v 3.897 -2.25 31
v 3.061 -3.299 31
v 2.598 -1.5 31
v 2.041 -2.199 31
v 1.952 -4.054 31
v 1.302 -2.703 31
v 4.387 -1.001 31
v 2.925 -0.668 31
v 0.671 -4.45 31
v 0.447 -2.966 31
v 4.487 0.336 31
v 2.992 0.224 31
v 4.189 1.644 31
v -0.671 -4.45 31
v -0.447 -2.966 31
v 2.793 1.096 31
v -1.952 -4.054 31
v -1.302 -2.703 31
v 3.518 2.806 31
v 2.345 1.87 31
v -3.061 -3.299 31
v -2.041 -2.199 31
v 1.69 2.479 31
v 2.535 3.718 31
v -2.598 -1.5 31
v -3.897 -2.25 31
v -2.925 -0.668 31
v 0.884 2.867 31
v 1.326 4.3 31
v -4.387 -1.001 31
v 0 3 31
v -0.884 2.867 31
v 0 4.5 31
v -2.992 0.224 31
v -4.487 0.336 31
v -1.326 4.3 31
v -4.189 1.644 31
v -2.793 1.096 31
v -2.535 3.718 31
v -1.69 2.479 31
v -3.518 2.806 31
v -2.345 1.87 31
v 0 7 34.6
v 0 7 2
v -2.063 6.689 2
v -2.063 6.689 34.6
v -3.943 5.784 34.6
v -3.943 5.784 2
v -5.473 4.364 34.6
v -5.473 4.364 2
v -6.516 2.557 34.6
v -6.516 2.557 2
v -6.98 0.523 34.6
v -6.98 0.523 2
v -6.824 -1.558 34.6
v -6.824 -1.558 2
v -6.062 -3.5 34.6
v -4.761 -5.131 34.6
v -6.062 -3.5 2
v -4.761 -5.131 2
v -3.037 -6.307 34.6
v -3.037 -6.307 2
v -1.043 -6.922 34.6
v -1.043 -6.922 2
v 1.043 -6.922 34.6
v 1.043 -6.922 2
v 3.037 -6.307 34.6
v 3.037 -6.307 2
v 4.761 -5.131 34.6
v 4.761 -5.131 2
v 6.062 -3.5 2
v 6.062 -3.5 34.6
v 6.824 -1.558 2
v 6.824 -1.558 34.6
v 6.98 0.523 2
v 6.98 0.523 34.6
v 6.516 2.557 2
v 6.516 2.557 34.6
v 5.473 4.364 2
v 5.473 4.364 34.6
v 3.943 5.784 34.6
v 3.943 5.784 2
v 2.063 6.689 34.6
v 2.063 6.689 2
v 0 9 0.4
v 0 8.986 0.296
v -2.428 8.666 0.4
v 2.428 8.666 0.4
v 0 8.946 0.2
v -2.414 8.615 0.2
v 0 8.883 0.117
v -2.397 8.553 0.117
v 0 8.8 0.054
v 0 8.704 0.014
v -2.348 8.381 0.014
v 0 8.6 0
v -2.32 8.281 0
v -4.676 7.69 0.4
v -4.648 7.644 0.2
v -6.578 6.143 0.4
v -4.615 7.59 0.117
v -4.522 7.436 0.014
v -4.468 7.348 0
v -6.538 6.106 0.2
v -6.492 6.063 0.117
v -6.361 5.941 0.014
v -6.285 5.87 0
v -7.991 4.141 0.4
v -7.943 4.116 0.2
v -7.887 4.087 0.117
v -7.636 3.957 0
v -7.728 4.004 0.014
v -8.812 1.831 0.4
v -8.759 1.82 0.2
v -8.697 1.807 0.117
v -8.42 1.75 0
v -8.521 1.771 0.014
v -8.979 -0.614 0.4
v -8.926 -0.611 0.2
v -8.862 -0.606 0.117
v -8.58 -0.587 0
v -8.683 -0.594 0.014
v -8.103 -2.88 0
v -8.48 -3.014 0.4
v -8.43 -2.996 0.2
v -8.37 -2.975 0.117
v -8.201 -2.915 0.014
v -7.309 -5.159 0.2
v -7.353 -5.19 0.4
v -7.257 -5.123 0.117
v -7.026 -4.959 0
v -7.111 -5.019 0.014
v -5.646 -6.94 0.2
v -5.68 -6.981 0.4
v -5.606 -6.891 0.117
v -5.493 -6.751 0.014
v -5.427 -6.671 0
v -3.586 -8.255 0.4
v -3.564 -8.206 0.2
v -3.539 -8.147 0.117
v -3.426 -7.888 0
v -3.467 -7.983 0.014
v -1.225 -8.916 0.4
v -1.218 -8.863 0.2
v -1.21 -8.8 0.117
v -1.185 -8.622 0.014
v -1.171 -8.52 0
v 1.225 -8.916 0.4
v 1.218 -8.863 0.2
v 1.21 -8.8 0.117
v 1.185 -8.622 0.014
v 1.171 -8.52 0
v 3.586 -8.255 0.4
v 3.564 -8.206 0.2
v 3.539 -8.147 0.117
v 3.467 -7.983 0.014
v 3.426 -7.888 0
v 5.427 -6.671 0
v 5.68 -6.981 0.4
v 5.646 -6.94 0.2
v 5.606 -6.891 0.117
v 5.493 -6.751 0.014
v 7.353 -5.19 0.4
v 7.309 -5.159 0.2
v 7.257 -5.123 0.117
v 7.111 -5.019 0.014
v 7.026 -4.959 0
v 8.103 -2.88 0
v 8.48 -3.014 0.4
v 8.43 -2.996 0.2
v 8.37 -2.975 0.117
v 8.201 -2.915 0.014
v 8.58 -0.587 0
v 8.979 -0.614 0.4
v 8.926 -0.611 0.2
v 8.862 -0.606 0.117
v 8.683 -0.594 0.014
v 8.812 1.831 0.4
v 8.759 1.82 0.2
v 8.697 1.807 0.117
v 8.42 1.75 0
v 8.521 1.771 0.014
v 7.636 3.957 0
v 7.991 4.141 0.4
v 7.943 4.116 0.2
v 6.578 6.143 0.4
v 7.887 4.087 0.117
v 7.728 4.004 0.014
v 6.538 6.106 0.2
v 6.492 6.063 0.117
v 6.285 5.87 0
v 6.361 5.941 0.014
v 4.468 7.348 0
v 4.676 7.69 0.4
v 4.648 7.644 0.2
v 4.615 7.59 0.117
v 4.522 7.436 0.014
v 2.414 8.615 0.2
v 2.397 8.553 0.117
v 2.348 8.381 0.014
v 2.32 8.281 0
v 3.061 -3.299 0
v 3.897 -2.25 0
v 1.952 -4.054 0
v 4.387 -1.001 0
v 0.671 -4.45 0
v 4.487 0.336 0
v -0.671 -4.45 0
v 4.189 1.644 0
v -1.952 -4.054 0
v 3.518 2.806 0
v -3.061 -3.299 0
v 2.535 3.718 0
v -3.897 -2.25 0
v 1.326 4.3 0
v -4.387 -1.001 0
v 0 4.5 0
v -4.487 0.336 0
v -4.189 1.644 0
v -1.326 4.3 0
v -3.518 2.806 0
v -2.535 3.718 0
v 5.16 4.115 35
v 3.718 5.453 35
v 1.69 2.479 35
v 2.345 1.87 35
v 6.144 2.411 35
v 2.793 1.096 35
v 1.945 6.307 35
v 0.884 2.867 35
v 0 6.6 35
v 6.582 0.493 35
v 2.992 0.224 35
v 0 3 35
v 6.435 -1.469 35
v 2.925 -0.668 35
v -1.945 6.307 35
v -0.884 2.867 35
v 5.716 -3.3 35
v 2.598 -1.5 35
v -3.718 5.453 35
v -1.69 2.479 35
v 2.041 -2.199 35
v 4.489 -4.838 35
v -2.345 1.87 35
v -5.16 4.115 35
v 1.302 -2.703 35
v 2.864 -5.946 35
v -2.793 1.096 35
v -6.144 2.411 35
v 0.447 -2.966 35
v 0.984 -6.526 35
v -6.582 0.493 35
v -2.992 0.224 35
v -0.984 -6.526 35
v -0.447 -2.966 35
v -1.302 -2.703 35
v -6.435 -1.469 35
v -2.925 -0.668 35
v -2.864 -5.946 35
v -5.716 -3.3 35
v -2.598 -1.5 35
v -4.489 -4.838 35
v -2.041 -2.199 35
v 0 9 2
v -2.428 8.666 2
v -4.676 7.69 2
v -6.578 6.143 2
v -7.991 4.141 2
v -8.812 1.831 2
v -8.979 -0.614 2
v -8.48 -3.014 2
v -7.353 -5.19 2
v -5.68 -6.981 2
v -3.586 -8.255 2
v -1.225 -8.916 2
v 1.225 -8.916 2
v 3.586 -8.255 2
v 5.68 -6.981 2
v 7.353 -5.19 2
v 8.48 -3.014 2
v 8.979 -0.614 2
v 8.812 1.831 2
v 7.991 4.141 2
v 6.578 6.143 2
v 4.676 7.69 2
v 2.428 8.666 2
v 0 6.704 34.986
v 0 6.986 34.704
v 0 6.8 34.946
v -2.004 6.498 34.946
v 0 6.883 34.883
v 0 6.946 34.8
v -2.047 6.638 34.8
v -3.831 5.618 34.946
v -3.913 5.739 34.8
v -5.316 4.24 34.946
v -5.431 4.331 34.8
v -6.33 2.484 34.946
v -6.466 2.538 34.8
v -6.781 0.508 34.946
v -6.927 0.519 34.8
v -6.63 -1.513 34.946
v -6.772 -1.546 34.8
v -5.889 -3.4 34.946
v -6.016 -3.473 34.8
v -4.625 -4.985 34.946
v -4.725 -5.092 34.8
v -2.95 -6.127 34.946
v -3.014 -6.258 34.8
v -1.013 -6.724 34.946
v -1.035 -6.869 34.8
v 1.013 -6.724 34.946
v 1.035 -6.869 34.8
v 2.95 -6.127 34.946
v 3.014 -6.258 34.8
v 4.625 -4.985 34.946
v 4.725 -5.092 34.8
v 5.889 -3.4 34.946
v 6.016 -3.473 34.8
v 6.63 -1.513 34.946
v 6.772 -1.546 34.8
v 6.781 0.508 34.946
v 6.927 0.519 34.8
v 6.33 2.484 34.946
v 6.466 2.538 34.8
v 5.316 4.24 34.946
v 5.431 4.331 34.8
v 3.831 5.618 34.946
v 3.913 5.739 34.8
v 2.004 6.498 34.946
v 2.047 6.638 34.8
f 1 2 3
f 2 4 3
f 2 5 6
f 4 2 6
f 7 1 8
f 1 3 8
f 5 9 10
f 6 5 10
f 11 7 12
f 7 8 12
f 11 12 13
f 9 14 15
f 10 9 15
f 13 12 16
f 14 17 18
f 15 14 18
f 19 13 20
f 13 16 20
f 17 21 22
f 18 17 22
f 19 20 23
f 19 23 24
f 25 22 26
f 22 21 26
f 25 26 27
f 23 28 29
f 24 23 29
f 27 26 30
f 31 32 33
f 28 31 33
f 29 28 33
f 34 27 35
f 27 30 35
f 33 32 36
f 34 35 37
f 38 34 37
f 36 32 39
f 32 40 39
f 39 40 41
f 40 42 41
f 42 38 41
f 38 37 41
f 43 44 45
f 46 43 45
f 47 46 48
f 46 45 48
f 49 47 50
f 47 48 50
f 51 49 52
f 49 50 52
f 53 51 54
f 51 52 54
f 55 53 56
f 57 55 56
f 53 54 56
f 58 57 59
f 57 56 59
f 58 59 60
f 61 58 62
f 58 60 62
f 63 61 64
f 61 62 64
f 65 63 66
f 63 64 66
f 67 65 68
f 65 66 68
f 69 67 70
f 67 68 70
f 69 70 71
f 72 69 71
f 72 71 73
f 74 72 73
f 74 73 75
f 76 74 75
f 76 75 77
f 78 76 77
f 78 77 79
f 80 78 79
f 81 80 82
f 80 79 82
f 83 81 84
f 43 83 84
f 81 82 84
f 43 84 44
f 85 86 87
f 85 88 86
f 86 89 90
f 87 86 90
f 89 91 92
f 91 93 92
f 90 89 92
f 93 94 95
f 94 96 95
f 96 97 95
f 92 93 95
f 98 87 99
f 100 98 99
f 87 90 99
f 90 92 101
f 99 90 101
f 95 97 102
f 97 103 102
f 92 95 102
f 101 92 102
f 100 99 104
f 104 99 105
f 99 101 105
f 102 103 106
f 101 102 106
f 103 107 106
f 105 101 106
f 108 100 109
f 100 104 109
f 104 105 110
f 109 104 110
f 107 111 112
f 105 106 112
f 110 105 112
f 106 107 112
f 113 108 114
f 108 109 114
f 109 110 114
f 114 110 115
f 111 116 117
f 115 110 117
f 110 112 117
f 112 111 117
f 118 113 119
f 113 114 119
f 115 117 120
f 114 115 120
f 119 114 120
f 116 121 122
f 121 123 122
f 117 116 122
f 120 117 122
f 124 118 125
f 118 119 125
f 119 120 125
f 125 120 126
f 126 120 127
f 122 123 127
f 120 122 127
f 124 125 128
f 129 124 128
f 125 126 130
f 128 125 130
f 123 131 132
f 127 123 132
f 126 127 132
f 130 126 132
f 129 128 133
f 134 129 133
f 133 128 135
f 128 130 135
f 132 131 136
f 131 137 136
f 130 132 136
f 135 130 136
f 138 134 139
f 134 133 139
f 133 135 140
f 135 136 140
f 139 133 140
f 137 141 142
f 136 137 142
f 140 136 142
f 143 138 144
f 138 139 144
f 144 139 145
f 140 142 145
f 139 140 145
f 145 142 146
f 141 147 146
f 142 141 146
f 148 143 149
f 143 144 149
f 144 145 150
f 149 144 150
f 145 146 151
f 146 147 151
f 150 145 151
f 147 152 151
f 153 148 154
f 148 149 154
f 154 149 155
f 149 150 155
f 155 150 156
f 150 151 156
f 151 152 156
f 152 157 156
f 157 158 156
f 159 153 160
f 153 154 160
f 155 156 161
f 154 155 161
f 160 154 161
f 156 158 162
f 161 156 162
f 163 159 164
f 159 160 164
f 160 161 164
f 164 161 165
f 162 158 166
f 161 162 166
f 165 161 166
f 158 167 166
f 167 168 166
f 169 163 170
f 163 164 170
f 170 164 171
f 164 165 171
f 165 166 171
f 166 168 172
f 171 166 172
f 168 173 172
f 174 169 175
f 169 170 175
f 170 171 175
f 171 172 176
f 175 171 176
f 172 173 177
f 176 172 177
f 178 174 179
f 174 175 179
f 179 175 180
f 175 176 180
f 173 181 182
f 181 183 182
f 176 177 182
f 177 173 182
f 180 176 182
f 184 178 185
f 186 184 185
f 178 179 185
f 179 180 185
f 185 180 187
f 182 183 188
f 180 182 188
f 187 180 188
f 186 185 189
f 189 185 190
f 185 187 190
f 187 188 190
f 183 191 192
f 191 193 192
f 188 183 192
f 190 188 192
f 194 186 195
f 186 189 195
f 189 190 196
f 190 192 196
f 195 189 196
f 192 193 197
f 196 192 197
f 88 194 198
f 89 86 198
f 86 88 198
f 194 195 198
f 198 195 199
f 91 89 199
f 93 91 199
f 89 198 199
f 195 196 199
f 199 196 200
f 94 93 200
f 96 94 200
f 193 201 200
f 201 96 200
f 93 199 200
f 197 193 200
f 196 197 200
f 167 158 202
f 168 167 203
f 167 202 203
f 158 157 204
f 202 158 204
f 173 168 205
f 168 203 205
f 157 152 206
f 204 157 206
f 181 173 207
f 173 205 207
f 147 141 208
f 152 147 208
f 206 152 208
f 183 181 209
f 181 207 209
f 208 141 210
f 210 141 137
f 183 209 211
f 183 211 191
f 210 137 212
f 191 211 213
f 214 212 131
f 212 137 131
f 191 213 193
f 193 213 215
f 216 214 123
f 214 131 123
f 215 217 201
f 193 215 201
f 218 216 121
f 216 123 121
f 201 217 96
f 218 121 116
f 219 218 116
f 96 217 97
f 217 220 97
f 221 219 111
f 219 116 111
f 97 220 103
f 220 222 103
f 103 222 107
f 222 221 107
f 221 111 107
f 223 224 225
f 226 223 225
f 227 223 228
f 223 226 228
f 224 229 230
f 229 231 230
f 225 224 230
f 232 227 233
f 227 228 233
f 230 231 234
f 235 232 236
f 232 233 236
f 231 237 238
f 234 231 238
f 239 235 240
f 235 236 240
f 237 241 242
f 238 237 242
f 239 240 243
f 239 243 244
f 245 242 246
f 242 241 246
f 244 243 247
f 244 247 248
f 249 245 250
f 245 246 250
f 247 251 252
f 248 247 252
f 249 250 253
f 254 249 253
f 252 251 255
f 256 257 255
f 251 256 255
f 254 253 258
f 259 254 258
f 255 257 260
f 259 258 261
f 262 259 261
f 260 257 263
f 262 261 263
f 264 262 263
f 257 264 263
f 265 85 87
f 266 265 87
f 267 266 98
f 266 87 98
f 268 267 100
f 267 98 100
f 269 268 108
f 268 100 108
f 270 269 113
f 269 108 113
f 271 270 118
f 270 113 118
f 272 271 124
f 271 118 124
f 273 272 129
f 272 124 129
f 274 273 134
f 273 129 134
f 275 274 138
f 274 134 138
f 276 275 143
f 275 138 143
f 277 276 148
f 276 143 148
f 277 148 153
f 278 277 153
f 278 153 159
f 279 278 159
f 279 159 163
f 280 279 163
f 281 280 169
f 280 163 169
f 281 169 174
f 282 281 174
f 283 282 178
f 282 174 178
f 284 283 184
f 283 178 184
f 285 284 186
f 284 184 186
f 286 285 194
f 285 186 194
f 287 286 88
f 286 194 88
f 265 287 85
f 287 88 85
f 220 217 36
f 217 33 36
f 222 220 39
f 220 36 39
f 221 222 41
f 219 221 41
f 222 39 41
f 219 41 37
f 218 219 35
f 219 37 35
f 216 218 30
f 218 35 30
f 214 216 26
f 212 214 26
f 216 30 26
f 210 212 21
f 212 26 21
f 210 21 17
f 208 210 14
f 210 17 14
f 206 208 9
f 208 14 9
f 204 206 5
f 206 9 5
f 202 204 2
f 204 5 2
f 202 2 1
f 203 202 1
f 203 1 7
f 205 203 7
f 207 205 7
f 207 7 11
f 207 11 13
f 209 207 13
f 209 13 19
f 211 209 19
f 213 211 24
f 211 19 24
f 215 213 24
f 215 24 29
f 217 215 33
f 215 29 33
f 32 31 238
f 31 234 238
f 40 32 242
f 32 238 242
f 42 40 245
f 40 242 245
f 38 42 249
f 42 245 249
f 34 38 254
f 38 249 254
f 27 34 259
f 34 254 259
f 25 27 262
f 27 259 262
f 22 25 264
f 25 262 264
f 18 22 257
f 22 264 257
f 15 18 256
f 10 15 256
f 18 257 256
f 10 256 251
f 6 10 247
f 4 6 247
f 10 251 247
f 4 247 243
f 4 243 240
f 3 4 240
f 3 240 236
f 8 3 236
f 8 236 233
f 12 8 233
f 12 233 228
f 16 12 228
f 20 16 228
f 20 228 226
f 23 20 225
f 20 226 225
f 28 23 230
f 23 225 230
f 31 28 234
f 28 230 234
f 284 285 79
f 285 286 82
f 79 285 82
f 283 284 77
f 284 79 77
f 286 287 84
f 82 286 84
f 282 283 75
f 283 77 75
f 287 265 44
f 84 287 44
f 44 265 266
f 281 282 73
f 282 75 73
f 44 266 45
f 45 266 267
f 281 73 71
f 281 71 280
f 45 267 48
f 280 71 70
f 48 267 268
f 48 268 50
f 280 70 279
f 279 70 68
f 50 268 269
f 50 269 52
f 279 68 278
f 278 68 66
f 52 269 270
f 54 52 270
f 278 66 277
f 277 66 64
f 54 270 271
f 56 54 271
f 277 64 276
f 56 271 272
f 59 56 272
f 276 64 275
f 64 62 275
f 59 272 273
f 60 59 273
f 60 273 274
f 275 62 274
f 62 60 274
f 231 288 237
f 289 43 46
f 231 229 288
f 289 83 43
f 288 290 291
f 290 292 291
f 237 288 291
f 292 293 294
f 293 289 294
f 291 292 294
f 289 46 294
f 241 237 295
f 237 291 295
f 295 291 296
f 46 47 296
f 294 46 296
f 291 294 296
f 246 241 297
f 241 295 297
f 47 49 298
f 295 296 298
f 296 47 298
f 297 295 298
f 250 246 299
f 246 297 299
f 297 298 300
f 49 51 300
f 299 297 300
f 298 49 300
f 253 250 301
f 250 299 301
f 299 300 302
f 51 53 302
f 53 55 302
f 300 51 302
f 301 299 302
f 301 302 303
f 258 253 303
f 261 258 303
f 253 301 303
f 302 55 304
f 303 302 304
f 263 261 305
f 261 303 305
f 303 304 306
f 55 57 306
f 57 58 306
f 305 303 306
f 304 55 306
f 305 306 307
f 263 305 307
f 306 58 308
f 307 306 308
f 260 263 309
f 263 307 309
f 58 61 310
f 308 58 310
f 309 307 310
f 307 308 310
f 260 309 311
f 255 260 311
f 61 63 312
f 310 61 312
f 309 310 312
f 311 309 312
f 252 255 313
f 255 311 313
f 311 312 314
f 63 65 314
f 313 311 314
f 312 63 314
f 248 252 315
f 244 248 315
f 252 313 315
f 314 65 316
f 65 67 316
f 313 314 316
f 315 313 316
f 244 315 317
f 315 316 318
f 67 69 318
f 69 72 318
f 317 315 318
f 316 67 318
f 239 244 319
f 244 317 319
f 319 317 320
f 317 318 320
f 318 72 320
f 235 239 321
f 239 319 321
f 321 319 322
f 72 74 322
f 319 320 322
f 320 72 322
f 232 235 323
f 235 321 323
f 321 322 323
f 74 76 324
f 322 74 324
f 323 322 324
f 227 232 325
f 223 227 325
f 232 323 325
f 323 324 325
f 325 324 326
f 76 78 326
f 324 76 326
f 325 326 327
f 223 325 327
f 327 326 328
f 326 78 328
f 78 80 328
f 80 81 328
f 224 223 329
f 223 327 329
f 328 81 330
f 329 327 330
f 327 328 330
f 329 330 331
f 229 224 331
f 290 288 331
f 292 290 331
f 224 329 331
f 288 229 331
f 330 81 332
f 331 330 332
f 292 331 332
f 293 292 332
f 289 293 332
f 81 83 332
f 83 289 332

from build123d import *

# Parameters (mm, degrees)
FILLET_1_R = 0.4


with BuildPart() as part:
    # Эскиз1 → Повернуть1 (revolve)
    with BuildSketch(Plane(origin=(0, 0, 0), x_dir=(0, 0, -1), z_dir=(1, 0, 0))):
        Polygon((-2, 7), (-2, 9), (0, 9), (0, 4.5), (-31, 4.5), (-31, 3), (-35, 3), (-35, 7), align=None)
    revolve(axis=Axis((0, 0, -80.9), (0, 0, 1)))

    # Скругление1
    fillet_1_edges = [part.edges().sort_by_distance(p)[0] for p in [
        (0, -7, 35),
        (0, -9, 0),
    ]]
    fillet(fillet_1_edges, radius=FILLET_1_R)


solid = part.part
